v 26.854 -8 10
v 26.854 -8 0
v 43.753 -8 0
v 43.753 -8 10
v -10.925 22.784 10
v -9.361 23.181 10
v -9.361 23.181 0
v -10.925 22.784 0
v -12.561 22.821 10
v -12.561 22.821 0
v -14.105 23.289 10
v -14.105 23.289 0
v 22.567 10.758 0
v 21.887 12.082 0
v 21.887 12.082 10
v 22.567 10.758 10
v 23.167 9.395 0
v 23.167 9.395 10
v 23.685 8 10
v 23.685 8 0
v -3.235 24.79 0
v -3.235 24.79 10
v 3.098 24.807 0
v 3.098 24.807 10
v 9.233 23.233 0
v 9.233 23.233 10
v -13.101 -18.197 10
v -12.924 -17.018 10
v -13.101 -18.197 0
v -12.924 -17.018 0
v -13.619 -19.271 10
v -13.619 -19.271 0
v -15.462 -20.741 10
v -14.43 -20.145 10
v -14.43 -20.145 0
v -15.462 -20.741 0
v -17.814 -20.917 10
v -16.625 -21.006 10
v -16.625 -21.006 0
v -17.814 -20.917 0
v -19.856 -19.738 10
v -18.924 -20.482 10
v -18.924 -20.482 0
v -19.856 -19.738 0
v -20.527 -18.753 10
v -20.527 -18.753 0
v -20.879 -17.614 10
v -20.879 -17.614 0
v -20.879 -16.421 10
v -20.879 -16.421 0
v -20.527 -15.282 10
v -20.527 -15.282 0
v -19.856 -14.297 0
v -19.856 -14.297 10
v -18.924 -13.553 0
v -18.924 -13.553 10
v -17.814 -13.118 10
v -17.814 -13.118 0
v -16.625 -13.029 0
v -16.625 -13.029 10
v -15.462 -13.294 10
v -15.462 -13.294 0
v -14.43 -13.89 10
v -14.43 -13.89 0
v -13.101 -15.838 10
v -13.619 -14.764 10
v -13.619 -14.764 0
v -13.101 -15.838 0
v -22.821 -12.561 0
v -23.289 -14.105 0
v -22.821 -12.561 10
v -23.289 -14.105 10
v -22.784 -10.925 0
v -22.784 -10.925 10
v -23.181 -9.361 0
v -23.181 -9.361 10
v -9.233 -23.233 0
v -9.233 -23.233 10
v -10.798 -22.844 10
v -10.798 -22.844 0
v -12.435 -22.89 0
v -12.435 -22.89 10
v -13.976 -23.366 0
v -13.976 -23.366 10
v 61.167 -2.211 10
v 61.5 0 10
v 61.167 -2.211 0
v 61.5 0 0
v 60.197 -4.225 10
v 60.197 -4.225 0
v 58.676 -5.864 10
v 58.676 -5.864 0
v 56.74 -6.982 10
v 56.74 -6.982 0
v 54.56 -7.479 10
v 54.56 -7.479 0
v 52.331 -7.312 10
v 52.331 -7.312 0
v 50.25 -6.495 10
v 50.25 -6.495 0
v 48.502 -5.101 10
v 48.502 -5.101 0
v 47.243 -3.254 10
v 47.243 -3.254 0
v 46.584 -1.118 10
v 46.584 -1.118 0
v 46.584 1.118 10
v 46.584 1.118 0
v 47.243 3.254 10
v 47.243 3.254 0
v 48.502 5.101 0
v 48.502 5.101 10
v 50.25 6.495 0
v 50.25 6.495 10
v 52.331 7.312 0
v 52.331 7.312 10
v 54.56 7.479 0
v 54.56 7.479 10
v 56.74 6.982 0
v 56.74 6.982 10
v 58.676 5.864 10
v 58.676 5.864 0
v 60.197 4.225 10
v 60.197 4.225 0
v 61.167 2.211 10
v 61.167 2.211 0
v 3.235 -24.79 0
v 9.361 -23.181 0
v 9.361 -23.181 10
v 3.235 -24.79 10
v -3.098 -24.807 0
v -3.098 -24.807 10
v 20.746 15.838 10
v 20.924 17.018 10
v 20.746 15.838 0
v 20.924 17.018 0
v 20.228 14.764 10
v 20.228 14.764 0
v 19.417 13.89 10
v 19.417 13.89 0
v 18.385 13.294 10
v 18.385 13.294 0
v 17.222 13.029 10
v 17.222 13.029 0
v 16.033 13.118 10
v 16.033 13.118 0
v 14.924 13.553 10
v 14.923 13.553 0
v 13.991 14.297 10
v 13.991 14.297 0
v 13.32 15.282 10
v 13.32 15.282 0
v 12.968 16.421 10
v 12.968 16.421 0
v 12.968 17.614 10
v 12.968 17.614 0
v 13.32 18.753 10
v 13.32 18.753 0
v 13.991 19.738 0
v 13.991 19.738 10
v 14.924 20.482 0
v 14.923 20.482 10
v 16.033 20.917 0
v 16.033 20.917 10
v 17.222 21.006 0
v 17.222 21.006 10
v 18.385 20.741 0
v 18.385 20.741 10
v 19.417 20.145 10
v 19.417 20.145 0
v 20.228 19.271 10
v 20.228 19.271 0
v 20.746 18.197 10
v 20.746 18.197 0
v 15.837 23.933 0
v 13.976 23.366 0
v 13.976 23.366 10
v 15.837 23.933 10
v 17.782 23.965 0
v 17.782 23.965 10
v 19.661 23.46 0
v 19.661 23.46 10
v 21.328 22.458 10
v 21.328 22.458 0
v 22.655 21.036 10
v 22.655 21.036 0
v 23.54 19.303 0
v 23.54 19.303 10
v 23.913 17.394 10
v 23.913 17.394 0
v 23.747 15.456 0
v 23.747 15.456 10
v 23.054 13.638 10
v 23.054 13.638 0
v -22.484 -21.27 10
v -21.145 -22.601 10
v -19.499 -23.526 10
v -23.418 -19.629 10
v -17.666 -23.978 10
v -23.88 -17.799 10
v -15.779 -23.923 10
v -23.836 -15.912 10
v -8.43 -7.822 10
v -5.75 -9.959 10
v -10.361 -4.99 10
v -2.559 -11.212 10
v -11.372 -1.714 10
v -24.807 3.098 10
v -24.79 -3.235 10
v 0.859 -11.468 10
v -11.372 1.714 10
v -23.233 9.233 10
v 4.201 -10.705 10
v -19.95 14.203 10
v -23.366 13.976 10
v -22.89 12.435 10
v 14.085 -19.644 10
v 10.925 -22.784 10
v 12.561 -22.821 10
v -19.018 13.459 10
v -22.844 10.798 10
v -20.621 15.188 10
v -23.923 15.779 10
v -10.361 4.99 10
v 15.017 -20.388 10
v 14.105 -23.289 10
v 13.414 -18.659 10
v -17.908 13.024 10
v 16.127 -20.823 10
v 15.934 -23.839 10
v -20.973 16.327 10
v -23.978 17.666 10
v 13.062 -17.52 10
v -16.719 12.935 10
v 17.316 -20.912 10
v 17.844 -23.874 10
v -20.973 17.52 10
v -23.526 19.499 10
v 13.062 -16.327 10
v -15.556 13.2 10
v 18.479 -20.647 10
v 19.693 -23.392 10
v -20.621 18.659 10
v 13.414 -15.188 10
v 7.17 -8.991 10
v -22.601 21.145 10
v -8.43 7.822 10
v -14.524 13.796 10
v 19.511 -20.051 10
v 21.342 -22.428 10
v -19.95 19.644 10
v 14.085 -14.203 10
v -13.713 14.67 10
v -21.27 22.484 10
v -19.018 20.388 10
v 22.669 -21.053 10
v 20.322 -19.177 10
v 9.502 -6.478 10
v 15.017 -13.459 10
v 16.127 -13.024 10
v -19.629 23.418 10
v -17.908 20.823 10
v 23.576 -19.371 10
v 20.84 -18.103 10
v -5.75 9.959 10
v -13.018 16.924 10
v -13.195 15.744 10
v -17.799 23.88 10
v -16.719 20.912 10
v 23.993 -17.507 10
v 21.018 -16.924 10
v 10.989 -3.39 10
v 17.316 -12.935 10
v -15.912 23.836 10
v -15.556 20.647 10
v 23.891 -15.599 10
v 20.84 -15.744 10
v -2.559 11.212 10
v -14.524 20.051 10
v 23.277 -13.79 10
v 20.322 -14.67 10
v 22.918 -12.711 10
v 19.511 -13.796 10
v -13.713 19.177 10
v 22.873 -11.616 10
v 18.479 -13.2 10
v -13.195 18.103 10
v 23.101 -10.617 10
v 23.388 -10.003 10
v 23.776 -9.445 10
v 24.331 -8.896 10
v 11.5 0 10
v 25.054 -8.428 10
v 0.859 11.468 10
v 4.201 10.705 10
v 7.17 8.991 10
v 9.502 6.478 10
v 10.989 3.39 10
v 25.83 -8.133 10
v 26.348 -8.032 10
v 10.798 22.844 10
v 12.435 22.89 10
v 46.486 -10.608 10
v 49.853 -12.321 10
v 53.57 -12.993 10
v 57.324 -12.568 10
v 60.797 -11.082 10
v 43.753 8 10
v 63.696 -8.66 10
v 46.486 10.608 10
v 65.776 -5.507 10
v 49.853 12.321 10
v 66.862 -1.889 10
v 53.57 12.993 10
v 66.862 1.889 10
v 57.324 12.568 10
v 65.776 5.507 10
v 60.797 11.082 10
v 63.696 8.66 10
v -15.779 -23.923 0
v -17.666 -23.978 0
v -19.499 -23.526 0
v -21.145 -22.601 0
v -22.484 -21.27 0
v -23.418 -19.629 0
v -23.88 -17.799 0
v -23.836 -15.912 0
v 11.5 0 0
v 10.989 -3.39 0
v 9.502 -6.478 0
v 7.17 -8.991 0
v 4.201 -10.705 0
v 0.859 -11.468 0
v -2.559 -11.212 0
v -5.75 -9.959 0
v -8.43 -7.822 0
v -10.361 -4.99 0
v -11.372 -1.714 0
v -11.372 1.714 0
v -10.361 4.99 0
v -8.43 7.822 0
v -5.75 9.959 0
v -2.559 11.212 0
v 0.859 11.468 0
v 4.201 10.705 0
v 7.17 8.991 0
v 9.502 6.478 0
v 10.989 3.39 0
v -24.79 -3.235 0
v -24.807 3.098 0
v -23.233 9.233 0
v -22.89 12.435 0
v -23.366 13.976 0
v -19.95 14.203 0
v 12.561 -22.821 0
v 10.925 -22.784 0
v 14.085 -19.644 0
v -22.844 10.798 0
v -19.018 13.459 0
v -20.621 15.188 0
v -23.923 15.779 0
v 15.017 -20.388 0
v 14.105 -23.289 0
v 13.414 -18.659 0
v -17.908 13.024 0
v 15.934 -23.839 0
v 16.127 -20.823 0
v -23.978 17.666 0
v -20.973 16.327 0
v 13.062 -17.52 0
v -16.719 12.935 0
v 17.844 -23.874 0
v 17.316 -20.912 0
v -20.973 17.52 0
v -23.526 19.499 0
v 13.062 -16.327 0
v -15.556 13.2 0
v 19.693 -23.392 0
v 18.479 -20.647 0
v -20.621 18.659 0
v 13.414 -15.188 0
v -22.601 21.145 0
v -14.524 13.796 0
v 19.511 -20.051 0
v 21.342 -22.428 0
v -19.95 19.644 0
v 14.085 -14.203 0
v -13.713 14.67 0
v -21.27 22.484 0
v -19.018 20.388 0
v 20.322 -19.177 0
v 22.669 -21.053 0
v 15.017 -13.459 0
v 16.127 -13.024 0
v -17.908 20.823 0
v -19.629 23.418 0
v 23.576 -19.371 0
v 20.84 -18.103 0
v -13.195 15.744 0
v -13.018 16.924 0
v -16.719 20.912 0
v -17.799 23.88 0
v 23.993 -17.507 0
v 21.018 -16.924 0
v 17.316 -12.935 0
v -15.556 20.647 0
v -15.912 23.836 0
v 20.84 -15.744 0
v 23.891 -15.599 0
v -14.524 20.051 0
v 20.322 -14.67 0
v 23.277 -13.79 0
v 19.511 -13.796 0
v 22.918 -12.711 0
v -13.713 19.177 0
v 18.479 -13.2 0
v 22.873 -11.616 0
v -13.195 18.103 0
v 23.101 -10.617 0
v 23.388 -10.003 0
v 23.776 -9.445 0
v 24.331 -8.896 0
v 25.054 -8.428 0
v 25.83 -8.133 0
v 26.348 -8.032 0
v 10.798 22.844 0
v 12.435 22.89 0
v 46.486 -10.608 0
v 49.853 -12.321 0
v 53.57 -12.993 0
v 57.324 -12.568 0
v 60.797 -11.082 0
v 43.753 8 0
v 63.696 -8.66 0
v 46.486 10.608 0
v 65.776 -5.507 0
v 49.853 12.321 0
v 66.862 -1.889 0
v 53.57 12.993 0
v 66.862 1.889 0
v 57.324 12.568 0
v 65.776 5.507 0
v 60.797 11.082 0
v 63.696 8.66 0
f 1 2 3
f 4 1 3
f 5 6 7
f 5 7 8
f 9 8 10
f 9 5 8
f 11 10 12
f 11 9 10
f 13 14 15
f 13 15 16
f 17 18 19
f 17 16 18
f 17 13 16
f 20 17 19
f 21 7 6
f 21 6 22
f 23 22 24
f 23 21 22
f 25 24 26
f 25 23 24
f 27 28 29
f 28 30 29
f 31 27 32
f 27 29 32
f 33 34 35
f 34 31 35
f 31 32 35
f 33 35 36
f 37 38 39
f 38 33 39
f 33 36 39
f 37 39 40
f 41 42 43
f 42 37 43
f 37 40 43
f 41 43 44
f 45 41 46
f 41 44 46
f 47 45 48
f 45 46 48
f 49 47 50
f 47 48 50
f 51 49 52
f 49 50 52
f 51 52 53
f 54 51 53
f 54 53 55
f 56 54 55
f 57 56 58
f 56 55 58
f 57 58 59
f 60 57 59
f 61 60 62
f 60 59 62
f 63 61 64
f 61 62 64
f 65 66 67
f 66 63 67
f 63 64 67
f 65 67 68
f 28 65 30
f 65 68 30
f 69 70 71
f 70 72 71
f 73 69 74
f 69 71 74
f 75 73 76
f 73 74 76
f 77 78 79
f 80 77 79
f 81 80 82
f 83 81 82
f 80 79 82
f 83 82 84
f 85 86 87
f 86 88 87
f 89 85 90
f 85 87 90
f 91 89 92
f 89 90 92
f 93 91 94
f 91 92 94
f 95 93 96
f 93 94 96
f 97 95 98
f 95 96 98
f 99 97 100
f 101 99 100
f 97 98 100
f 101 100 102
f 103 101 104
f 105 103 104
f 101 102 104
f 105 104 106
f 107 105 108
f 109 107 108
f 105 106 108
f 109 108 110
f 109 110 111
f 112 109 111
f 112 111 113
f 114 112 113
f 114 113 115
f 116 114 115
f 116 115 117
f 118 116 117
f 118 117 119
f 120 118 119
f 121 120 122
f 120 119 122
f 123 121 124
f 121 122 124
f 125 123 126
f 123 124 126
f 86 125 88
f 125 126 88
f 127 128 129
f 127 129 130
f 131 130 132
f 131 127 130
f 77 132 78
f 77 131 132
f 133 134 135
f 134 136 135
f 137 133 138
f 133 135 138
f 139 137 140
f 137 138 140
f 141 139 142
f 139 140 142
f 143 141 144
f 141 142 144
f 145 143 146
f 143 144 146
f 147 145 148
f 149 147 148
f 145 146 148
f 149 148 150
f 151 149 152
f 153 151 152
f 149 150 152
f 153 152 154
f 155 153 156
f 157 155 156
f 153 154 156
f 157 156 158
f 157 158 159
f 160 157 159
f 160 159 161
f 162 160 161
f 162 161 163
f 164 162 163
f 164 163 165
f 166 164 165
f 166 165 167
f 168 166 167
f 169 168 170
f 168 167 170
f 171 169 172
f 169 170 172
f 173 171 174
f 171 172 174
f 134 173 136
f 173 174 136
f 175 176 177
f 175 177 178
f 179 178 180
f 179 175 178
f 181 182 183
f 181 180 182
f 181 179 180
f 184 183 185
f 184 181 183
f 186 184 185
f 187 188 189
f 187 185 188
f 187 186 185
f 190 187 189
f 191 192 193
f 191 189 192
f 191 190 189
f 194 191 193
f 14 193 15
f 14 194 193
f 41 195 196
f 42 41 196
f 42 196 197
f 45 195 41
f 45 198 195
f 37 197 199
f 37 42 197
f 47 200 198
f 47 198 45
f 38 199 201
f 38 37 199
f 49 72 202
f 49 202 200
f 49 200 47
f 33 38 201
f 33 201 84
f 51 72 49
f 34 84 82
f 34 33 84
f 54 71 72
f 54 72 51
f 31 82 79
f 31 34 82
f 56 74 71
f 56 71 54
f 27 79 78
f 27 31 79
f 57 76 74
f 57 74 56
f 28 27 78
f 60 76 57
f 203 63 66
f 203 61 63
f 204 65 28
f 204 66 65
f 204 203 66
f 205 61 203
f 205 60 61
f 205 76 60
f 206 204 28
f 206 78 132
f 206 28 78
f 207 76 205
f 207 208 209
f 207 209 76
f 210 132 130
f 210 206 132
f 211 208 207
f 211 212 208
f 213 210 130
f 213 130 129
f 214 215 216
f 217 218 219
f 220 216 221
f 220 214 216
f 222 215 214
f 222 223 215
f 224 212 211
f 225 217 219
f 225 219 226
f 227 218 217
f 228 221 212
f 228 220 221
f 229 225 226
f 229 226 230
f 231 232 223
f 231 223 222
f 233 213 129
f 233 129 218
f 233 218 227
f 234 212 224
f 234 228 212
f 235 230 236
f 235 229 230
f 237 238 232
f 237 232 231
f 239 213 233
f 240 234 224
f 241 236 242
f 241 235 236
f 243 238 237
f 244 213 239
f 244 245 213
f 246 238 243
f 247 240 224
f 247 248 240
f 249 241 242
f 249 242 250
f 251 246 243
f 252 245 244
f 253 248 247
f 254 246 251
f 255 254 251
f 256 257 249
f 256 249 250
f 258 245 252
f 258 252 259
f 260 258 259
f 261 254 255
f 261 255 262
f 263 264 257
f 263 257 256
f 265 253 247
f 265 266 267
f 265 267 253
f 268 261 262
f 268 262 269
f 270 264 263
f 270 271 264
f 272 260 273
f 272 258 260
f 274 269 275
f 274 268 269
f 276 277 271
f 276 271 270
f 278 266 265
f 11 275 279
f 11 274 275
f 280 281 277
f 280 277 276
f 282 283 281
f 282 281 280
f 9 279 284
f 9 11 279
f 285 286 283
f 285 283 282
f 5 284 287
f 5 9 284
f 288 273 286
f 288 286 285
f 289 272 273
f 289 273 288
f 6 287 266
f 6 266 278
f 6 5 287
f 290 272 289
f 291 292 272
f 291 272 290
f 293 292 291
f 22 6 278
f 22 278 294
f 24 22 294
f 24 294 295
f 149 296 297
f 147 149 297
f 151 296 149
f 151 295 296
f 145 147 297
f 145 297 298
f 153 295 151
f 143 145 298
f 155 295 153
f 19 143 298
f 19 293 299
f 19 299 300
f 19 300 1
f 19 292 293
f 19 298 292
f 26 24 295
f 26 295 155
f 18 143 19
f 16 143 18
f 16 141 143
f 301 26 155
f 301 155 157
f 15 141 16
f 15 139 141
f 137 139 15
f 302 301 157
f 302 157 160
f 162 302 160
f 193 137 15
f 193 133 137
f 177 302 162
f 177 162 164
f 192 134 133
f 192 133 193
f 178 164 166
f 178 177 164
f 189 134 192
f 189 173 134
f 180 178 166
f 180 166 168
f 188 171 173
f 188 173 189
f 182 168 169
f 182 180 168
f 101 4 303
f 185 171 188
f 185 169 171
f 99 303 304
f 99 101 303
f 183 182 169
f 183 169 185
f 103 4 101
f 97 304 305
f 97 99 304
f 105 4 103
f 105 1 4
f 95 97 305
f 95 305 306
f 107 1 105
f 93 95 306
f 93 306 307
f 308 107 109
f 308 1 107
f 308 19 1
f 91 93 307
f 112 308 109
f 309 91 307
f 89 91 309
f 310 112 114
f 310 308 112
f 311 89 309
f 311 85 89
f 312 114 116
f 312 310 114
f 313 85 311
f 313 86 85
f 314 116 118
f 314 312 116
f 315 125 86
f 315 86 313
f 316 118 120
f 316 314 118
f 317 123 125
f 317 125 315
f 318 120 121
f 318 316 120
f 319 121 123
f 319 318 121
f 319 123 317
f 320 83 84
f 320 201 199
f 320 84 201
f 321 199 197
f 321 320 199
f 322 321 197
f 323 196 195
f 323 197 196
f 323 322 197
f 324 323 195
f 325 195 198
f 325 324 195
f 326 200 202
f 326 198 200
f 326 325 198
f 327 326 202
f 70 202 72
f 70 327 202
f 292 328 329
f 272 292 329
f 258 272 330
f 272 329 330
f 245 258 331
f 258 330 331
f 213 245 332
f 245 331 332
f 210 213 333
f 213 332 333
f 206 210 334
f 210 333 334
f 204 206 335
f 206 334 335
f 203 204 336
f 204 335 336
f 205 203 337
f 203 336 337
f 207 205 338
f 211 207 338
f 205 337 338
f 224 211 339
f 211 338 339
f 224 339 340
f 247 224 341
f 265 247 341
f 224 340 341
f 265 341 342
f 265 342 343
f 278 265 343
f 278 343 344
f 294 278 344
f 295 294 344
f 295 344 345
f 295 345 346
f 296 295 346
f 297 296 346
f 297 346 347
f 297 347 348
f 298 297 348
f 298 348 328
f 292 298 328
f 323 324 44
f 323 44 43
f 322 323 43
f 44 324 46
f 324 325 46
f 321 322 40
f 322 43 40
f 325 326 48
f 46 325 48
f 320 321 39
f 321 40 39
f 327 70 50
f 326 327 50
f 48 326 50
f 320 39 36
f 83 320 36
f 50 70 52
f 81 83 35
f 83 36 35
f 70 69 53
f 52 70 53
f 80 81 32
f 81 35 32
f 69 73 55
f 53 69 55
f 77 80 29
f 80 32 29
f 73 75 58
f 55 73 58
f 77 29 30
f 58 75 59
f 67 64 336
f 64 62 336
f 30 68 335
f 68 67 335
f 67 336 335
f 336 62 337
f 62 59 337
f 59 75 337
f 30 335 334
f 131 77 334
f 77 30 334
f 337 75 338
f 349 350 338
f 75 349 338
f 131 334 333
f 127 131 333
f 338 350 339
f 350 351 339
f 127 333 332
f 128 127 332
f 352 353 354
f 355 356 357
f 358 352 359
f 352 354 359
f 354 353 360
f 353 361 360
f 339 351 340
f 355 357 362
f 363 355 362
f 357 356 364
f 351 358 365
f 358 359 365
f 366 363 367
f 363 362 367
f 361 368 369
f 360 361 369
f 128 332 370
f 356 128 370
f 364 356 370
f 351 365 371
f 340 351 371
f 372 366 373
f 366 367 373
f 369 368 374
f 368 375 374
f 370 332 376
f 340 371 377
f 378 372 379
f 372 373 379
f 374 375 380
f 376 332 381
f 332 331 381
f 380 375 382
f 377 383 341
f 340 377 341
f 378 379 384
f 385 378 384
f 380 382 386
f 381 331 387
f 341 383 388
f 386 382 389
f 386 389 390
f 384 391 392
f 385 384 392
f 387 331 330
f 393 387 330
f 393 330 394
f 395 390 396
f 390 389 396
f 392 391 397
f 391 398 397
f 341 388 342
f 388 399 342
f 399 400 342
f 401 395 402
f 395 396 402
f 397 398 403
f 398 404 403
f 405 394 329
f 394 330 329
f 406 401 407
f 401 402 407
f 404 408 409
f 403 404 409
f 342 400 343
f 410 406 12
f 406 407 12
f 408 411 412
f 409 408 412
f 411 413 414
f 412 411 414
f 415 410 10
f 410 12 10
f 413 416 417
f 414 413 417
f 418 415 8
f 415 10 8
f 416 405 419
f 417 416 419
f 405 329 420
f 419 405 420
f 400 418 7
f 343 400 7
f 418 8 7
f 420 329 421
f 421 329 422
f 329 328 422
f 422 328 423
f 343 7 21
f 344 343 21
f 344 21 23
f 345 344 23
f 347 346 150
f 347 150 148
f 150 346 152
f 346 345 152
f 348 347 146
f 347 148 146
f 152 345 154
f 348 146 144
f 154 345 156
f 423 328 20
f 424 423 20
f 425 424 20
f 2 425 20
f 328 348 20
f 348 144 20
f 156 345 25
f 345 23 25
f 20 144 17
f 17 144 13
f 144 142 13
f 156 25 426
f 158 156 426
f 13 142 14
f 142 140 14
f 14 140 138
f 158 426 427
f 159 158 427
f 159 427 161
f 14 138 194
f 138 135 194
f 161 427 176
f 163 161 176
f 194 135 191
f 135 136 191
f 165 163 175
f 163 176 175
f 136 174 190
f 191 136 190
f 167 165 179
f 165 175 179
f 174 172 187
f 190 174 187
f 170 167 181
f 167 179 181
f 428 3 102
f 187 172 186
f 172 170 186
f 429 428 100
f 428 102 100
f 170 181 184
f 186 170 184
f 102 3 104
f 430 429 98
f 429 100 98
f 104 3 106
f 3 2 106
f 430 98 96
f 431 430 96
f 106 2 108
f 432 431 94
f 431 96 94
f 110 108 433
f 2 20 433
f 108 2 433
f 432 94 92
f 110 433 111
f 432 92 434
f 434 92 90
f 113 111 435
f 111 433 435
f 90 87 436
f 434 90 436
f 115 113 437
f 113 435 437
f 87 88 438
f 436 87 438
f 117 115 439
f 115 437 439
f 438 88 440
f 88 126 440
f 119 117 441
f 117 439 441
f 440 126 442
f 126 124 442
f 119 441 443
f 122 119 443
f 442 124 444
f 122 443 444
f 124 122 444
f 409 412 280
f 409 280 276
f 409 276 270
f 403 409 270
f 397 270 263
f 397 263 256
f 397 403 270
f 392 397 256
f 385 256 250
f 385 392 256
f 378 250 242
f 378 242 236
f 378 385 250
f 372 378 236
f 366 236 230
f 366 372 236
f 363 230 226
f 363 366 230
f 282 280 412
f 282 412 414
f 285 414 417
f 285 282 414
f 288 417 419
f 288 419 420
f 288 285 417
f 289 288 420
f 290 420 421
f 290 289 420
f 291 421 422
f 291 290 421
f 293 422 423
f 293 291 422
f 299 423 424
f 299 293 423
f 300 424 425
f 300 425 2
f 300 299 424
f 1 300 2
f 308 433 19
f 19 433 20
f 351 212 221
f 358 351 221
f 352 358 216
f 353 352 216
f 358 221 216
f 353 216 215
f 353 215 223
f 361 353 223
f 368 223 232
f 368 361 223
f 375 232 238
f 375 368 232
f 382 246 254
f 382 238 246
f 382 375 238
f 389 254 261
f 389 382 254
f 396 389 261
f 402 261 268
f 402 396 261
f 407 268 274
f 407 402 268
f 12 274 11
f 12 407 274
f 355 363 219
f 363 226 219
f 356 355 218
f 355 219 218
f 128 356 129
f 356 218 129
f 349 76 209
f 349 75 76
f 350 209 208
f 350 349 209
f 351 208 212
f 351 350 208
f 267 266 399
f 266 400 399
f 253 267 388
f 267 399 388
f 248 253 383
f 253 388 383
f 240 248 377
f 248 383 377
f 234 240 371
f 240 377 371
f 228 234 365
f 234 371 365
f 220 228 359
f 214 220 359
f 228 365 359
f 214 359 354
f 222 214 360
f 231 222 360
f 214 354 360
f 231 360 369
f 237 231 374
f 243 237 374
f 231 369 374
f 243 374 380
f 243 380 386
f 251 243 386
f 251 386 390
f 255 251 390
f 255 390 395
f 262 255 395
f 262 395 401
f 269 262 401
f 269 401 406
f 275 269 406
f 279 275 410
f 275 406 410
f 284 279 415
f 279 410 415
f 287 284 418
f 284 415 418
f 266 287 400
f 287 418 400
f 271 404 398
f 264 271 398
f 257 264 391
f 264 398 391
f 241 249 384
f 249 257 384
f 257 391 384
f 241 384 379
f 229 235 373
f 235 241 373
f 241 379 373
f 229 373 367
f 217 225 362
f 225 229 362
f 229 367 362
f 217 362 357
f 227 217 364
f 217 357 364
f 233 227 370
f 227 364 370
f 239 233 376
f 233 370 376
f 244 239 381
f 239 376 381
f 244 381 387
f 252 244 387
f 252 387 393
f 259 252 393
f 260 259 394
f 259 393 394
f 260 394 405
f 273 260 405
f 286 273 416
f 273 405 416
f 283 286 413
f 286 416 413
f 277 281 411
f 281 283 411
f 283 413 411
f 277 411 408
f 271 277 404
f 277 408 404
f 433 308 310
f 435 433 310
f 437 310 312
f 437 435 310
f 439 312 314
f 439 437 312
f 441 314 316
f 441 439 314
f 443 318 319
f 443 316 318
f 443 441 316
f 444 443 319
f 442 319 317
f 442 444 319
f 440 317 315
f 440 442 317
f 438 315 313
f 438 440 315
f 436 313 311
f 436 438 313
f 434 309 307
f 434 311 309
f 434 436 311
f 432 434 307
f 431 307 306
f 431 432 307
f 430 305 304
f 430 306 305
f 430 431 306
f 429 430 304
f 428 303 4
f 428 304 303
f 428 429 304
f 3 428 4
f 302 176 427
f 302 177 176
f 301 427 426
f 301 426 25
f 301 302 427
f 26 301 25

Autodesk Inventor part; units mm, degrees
ref_plane "YZ Plane" through (0, 0, 0) normal (1, 0, 0) x (0, 1, 0)
ref_plane "XZ Plane" through (0, 0, 0) normal (0, 1, 0) x (-1, 0, 0)
ref_plane "XY Plane" through (0, 0, 0) normal (0, 0, 1) x (1, 0, 0)
sketch "Sketch1" plane through (0, 0, 0) normal (1, 0, 0) x (0, 1, 0)
  point P0 (0, 0)
sketch "Sketch2" plane through (0, 0, 0) normal (0, 0, 1) x (1, 0, 0)
  circle A0 centre (0, 0) radius 11.5
  line L0 (0, 0) -> (16.9235, 17.0175)
  circle A1 centre (16.9235, 17.0175) radius 4
  circle A2 centre (16.9235, 17.0175) radius 7
  circle A3 centre (-17.0175, 16.9235) radius 4
  circle A4 centre (-17.0175, 16.9235) radius 7
  circle A5 centre (-16.9235, -17.0175) radius 4
  circle A6 centre (-16.9235, -17.0175) radius 7
  circle A7 centre (17.0175, -16.9235) radius 4
  circle A8 centre (17.0175, -16.9235) radius 7
  line L1 (0, 0) -> (54, 0)
  circle A9 centre (54, 0) radius 7.5
  circle A10 centre (54, 0) radius 13
  line L2 (34.0355, 0) -> (34.0355, 8)
  line L3 (34.0355, 8) -> (34.0355, -8)
  line L4 (34.0355, -8) -> (43.753, -8)
  line L5 (23.6854, -8) -> (34.0355, -8)
  line L6 (34.0355, 8) -> (43.753, 8)
  line L7 (34.0355, 8) -> (23.6854, 8)
  arc A11 (-19.5919, 13.8621) -> (-21.1769, 11.2933) centre (0, 0) ccw
  arc A12 (11.96, 21.9535) -> (-12.0815, 21.8869) centre (0, 0) ccw
  arc A13 (-21.9535, 11.96) -> (-21.8869, -12.0815) centre (0, 0) ccw
  arc A14 (-11.96, -21.9535) -> (12.0815, -21.8869) centre (0, 0) ccw
  arc A15 (21.9535, -11.96) -> (21.8869, 12.0815) centre (0, 0) ccw
  dimension "d1" = 23
  dimension "d4" = 8
  dimension "d5" = 14
  dimension "d8" = 360
  dimension "d10" = 54
  dimension "d11" = 15
  dimension "d12" = 26
  dimension "d13" = 8
  dimension "d14" = 16
extrude "Extrusion1" add sketch "Sketch2" along normal blind 10 contours L1 A15 A8 A14 A6 A13 A4 A12 A2 L0 A0 | A0 L0 A2 A15 L1 | A15 L7 L2 L1 | L1 L3 L5 A15 | A2 | L2 L6 A10 L1 | L1 A10 L4 L3 | A10 | A8 | A4 | A6 | A9
extrude "Extrusion2" cut sketch "Sketch2" along normal blind 10 contours A9
fillet "Fillet1" radius 4 2 edges at (23.6854, -8, 5) (21.9535, -11.96, 5)
fillet "Fillet2" radius 6 6 edges at (11.96, 21.9535, 5) (-12.0815, 21.8869, 5) (-21.9535, 11.96, 5) (-21.8869, -12.0815, 5) (-11.96, -21.9535, 5) (12.0815, -21.8869, 5)
properties part number "hw13"
